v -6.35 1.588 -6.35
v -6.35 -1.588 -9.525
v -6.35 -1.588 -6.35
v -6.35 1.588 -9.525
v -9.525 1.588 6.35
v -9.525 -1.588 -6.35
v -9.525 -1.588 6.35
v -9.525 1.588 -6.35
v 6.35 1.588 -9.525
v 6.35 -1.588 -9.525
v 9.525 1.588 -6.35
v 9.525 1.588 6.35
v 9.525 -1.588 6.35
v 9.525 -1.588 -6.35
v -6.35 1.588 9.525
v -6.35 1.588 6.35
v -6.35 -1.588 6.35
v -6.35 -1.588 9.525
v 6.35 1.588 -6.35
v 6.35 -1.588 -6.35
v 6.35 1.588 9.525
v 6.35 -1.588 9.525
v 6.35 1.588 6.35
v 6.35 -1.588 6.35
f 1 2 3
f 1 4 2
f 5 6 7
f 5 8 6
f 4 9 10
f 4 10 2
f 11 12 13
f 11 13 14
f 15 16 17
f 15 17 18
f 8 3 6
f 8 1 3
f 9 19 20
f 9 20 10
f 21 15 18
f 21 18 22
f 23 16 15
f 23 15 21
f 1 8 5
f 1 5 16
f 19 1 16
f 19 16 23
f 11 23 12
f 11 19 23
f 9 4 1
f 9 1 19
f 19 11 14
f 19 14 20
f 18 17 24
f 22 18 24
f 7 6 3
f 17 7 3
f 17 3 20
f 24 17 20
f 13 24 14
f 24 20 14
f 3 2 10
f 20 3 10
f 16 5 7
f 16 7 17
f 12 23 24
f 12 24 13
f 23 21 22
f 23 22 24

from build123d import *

# Parameters (mm, degrees)
BOSS_EXTRUDE1_DEPTH = 1.5875


with BuildPart() as part:
    # Sketch1 → Boss-Extrude1 (new body, symmetric)
    with BuildSketch(Plane(origin=(0, 0, 0), x_dir=(1, 0, 0), z_dir=(0, 1, 0))):
        Polygon((-9.525, 6.35), (-9.525, -6.35), (-6.35, -6.35), (-6.35, -9.525), (6.35, -9.525), (6.35, -6.35), (9.525, -6.35), (9.525, 6.35), (6.35, 6.35), (6.35, 9.525), (-6.35, 9.525), (-6.35, 6.35), align=None)
    extrude(amount=BOSS_EXTRUDE1_DEPTH, both=True)


solid = part.part
